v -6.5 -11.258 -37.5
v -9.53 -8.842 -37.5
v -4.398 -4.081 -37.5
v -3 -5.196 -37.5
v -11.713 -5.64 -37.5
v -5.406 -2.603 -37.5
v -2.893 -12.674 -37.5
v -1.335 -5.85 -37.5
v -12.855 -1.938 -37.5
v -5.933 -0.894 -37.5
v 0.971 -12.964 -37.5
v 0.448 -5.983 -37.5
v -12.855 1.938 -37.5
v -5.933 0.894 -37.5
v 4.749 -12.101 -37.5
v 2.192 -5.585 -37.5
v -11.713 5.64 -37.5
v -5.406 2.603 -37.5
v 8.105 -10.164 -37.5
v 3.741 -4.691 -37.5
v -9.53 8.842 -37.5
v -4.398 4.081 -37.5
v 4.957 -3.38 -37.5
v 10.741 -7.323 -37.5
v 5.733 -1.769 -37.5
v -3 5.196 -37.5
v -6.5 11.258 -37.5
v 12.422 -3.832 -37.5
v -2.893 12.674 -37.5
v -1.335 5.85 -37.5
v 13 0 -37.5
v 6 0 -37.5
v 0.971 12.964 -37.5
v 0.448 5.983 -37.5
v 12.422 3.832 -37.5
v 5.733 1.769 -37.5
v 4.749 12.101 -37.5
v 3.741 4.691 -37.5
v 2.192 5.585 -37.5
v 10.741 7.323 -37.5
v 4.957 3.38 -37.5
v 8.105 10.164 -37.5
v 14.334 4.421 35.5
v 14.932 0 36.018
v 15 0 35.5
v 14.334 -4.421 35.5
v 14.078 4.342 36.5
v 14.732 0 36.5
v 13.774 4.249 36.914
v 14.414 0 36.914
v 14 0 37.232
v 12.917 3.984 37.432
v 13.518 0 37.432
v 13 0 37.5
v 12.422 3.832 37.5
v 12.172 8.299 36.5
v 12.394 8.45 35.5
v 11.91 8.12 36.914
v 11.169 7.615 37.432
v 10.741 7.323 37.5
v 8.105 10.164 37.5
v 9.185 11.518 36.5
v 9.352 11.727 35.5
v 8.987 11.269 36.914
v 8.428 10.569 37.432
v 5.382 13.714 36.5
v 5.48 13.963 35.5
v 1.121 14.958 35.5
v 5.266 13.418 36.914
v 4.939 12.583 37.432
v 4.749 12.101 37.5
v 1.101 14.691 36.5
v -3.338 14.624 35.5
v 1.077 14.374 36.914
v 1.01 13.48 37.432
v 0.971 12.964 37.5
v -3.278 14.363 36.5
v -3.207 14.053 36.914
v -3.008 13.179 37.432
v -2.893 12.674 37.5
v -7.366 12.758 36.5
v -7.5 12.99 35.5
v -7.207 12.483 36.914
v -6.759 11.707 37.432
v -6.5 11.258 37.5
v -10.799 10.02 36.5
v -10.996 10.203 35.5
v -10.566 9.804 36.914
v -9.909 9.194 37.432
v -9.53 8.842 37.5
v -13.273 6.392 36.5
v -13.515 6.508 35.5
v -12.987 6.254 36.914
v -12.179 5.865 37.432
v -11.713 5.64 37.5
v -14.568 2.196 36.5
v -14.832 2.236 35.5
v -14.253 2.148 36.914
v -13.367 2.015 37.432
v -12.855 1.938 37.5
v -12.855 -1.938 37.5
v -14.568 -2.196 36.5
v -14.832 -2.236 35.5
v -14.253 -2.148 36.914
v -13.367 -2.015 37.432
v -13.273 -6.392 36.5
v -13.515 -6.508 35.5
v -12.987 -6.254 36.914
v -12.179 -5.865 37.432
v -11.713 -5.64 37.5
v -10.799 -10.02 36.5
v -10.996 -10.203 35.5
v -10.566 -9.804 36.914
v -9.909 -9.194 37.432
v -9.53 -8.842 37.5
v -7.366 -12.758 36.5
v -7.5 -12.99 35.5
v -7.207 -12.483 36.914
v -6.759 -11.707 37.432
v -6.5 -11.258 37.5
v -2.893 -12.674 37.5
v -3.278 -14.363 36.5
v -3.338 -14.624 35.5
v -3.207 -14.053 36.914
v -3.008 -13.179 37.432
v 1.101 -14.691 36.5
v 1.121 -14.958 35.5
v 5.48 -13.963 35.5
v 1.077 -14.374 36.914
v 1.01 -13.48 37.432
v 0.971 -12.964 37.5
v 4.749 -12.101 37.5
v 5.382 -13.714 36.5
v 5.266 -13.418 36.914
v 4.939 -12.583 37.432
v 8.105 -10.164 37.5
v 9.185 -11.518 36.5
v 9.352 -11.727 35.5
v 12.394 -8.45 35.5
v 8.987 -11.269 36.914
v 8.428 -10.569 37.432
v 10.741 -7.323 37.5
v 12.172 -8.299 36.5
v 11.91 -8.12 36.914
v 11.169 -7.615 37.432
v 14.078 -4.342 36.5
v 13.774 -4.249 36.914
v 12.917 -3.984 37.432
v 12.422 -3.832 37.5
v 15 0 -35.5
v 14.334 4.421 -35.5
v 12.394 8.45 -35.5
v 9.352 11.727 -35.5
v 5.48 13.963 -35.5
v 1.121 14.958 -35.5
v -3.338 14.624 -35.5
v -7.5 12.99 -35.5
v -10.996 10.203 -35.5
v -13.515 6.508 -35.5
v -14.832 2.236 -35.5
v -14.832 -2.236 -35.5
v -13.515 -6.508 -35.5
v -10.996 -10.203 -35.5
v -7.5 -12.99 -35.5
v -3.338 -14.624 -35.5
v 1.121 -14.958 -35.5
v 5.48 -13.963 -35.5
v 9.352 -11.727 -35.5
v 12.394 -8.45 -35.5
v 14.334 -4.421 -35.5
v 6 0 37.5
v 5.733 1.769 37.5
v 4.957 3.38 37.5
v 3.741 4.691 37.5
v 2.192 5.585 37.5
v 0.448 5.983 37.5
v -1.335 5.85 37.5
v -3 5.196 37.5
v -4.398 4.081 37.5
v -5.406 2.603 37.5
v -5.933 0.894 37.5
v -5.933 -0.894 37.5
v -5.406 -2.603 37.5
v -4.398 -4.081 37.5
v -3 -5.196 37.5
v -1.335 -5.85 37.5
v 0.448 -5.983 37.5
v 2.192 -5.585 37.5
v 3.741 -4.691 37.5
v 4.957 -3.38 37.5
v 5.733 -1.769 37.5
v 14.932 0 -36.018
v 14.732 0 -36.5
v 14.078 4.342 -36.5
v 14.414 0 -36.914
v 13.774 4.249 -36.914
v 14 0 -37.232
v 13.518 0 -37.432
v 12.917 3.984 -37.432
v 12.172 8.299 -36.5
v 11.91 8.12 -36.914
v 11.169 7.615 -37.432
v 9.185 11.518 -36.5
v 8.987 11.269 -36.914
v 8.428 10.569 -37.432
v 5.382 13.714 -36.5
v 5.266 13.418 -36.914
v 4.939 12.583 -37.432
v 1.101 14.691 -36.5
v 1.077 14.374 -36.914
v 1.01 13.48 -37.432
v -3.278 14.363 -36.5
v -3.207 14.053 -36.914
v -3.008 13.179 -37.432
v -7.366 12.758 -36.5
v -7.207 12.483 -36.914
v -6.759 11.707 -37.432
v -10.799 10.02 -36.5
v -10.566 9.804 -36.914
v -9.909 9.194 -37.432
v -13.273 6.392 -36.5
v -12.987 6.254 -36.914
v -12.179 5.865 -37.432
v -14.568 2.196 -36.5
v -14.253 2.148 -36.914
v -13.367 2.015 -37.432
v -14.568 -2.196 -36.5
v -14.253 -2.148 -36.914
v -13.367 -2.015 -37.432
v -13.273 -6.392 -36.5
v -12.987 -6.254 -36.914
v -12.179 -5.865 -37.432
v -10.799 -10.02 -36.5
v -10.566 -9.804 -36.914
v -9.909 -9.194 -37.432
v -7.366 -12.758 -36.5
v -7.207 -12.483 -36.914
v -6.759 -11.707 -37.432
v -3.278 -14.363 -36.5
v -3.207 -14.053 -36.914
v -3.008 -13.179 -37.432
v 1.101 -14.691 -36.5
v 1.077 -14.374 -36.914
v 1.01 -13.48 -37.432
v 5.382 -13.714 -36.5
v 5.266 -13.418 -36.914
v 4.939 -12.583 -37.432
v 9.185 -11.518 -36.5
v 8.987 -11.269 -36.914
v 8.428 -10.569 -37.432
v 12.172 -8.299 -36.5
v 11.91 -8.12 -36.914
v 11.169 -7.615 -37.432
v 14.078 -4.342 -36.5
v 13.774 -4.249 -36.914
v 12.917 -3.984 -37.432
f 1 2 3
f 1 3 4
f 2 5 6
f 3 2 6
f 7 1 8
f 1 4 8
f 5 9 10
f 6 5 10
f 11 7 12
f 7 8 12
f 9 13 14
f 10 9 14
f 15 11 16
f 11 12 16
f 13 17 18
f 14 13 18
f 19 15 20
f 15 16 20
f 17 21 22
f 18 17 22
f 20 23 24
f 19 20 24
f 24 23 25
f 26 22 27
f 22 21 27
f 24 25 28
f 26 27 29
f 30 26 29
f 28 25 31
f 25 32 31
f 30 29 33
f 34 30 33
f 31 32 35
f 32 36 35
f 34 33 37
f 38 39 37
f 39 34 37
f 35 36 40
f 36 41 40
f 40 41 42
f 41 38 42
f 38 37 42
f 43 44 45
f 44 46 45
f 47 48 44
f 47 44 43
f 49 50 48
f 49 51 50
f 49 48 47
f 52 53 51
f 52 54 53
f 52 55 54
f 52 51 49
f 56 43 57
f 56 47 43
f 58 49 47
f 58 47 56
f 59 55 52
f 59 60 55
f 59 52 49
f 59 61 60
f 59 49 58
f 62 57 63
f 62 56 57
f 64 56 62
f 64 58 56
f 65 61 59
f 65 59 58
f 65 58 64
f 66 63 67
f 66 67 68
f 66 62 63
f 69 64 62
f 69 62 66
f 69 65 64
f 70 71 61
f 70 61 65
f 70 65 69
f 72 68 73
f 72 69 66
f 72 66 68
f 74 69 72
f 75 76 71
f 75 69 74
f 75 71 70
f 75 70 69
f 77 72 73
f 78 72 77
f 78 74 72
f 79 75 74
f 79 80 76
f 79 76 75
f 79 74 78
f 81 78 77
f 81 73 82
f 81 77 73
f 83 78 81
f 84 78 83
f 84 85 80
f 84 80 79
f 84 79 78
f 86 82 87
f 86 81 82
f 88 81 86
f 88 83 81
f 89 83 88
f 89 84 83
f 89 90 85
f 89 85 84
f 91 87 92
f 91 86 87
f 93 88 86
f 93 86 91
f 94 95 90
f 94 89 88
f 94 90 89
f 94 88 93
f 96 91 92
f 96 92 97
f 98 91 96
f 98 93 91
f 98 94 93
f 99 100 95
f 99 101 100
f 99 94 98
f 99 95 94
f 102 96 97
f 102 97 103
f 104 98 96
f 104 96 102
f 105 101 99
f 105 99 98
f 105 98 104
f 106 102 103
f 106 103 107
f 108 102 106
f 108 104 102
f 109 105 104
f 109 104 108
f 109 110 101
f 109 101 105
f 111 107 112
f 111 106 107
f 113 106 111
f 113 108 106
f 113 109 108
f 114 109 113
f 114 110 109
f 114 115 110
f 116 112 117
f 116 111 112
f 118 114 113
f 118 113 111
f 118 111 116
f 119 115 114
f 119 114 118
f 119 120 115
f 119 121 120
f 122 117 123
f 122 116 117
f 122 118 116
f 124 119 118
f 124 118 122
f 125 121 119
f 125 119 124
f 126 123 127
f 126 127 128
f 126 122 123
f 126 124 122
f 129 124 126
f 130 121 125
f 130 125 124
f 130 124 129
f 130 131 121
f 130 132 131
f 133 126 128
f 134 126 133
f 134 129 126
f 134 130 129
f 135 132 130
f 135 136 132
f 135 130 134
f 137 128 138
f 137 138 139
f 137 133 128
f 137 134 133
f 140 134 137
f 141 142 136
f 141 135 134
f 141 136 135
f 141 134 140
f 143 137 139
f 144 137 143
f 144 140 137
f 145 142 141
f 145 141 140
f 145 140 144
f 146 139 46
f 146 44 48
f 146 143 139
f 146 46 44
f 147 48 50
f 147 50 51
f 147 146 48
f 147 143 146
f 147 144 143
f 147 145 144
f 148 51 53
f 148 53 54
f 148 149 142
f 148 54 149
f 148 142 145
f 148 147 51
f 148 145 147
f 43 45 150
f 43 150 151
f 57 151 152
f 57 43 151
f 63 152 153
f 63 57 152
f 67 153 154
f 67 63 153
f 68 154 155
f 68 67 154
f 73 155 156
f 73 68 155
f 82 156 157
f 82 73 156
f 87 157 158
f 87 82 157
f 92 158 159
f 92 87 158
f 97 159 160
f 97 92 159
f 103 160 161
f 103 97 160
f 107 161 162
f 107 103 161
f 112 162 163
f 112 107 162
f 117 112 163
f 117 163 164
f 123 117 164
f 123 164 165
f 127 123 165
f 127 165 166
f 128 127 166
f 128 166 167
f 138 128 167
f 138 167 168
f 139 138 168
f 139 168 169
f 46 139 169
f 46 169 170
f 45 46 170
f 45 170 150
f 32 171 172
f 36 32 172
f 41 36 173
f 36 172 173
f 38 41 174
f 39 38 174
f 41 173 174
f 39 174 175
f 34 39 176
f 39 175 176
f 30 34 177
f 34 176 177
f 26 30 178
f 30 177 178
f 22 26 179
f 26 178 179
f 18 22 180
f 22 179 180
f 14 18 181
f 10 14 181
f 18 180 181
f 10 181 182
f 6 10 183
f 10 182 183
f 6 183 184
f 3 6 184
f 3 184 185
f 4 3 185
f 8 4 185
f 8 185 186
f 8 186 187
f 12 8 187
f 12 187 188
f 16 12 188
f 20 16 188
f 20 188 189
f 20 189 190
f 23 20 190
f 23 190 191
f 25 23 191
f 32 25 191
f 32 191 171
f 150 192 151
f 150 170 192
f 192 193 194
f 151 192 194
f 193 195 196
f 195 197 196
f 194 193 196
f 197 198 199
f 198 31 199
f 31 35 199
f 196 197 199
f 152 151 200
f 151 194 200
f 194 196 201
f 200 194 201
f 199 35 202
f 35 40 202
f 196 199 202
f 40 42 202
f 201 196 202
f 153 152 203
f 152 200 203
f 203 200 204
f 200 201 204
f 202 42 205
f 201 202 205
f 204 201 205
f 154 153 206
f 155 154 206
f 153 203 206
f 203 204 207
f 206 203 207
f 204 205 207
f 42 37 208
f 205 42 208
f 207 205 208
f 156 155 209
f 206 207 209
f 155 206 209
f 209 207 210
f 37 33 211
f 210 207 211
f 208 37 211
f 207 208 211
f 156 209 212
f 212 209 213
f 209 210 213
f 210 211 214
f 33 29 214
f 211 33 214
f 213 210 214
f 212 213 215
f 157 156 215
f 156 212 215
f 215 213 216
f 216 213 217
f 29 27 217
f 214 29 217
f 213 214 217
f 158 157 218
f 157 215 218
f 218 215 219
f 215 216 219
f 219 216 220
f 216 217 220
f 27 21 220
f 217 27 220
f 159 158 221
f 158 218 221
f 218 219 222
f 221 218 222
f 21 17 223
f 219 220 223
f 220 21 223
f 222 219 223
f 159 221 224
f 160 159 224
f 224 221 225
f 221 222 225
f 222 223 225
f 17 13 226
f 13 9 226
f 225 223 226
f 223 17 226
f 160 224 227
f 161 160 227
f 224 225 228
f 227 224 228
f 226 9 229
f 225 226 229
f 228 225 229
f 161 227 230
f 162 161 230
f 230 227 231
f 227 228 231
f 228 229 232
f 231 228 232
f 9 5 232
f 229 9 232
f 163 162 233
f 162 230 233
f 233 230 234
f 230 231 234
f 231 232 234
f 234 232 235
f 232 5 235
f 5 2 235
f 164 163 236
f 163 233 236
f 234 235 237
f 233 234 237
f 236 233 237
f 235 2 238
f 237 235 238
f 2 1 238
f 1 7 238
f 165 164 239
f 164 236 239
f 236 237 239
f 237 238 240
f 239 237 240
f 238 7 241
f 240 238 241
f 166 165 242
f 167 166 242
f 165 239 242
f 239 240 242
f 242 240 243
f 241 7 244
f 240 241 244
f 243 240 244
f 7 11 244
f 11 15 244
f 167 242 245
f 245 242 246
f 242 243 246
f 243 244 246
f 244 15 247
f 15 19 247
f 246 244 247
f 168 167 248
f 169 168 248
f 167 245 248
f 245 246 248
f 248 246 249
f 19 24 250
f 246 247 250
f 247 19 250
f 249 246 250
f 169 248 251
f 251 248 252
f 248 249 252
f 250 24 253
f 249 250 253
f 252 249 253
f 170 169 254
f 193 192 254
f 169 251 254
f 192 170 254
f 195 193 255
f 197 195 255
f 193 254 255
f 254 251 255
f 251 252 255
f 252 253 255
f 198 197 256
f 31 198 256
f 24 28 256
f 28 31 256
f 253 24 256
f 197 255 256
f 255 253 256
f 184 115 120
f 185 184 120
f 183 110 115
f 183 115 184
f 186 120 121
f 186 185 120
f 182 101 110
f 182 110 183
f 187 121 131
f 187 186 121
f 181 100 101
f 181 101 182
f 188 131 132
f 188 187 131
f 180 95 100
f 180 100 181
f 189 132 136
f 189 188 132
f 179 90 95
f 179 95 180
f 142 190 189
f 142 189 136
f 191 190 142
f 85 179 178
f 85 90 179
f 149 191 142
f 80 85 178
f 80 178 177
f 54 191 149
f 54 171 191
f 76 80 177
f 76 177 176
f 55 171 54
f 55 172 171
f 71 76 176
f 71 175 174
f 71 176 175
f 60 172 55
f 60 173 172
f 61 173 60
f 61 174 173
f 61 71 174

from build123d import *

# Parameters (mm, degrees)
F0_R     = 15
F1_DEPTH = 37.5
F2_R     = 2
F3_R     = 6
F4_DEPTH = 75.001


with BuildPart() as f1:
    # F0 (on Top) → F1 (new body, symmetric)
    with BuildSketch(Plane.XY):
        Circle(F0_R)
    extrude(amount=F1_DEPTH, both=True)

    # F2
    f2_edges = [f1.edges().sort_by_distance(p)[0] for p in [
        (-15, 0, 37.5),
        (-15, 0, -37.5),
    ]]
    fillet(f2_edges, radius=F2_R)

    # F3 (on face) → F4 (cut, through all)
    with BuildSketch(Plane.XY.offset(37.5)):
        Circle(F3_R)
    extrude(amount=-F4_DEPTH, mode=Mode.SUBTRACT)


solid = f1.part
